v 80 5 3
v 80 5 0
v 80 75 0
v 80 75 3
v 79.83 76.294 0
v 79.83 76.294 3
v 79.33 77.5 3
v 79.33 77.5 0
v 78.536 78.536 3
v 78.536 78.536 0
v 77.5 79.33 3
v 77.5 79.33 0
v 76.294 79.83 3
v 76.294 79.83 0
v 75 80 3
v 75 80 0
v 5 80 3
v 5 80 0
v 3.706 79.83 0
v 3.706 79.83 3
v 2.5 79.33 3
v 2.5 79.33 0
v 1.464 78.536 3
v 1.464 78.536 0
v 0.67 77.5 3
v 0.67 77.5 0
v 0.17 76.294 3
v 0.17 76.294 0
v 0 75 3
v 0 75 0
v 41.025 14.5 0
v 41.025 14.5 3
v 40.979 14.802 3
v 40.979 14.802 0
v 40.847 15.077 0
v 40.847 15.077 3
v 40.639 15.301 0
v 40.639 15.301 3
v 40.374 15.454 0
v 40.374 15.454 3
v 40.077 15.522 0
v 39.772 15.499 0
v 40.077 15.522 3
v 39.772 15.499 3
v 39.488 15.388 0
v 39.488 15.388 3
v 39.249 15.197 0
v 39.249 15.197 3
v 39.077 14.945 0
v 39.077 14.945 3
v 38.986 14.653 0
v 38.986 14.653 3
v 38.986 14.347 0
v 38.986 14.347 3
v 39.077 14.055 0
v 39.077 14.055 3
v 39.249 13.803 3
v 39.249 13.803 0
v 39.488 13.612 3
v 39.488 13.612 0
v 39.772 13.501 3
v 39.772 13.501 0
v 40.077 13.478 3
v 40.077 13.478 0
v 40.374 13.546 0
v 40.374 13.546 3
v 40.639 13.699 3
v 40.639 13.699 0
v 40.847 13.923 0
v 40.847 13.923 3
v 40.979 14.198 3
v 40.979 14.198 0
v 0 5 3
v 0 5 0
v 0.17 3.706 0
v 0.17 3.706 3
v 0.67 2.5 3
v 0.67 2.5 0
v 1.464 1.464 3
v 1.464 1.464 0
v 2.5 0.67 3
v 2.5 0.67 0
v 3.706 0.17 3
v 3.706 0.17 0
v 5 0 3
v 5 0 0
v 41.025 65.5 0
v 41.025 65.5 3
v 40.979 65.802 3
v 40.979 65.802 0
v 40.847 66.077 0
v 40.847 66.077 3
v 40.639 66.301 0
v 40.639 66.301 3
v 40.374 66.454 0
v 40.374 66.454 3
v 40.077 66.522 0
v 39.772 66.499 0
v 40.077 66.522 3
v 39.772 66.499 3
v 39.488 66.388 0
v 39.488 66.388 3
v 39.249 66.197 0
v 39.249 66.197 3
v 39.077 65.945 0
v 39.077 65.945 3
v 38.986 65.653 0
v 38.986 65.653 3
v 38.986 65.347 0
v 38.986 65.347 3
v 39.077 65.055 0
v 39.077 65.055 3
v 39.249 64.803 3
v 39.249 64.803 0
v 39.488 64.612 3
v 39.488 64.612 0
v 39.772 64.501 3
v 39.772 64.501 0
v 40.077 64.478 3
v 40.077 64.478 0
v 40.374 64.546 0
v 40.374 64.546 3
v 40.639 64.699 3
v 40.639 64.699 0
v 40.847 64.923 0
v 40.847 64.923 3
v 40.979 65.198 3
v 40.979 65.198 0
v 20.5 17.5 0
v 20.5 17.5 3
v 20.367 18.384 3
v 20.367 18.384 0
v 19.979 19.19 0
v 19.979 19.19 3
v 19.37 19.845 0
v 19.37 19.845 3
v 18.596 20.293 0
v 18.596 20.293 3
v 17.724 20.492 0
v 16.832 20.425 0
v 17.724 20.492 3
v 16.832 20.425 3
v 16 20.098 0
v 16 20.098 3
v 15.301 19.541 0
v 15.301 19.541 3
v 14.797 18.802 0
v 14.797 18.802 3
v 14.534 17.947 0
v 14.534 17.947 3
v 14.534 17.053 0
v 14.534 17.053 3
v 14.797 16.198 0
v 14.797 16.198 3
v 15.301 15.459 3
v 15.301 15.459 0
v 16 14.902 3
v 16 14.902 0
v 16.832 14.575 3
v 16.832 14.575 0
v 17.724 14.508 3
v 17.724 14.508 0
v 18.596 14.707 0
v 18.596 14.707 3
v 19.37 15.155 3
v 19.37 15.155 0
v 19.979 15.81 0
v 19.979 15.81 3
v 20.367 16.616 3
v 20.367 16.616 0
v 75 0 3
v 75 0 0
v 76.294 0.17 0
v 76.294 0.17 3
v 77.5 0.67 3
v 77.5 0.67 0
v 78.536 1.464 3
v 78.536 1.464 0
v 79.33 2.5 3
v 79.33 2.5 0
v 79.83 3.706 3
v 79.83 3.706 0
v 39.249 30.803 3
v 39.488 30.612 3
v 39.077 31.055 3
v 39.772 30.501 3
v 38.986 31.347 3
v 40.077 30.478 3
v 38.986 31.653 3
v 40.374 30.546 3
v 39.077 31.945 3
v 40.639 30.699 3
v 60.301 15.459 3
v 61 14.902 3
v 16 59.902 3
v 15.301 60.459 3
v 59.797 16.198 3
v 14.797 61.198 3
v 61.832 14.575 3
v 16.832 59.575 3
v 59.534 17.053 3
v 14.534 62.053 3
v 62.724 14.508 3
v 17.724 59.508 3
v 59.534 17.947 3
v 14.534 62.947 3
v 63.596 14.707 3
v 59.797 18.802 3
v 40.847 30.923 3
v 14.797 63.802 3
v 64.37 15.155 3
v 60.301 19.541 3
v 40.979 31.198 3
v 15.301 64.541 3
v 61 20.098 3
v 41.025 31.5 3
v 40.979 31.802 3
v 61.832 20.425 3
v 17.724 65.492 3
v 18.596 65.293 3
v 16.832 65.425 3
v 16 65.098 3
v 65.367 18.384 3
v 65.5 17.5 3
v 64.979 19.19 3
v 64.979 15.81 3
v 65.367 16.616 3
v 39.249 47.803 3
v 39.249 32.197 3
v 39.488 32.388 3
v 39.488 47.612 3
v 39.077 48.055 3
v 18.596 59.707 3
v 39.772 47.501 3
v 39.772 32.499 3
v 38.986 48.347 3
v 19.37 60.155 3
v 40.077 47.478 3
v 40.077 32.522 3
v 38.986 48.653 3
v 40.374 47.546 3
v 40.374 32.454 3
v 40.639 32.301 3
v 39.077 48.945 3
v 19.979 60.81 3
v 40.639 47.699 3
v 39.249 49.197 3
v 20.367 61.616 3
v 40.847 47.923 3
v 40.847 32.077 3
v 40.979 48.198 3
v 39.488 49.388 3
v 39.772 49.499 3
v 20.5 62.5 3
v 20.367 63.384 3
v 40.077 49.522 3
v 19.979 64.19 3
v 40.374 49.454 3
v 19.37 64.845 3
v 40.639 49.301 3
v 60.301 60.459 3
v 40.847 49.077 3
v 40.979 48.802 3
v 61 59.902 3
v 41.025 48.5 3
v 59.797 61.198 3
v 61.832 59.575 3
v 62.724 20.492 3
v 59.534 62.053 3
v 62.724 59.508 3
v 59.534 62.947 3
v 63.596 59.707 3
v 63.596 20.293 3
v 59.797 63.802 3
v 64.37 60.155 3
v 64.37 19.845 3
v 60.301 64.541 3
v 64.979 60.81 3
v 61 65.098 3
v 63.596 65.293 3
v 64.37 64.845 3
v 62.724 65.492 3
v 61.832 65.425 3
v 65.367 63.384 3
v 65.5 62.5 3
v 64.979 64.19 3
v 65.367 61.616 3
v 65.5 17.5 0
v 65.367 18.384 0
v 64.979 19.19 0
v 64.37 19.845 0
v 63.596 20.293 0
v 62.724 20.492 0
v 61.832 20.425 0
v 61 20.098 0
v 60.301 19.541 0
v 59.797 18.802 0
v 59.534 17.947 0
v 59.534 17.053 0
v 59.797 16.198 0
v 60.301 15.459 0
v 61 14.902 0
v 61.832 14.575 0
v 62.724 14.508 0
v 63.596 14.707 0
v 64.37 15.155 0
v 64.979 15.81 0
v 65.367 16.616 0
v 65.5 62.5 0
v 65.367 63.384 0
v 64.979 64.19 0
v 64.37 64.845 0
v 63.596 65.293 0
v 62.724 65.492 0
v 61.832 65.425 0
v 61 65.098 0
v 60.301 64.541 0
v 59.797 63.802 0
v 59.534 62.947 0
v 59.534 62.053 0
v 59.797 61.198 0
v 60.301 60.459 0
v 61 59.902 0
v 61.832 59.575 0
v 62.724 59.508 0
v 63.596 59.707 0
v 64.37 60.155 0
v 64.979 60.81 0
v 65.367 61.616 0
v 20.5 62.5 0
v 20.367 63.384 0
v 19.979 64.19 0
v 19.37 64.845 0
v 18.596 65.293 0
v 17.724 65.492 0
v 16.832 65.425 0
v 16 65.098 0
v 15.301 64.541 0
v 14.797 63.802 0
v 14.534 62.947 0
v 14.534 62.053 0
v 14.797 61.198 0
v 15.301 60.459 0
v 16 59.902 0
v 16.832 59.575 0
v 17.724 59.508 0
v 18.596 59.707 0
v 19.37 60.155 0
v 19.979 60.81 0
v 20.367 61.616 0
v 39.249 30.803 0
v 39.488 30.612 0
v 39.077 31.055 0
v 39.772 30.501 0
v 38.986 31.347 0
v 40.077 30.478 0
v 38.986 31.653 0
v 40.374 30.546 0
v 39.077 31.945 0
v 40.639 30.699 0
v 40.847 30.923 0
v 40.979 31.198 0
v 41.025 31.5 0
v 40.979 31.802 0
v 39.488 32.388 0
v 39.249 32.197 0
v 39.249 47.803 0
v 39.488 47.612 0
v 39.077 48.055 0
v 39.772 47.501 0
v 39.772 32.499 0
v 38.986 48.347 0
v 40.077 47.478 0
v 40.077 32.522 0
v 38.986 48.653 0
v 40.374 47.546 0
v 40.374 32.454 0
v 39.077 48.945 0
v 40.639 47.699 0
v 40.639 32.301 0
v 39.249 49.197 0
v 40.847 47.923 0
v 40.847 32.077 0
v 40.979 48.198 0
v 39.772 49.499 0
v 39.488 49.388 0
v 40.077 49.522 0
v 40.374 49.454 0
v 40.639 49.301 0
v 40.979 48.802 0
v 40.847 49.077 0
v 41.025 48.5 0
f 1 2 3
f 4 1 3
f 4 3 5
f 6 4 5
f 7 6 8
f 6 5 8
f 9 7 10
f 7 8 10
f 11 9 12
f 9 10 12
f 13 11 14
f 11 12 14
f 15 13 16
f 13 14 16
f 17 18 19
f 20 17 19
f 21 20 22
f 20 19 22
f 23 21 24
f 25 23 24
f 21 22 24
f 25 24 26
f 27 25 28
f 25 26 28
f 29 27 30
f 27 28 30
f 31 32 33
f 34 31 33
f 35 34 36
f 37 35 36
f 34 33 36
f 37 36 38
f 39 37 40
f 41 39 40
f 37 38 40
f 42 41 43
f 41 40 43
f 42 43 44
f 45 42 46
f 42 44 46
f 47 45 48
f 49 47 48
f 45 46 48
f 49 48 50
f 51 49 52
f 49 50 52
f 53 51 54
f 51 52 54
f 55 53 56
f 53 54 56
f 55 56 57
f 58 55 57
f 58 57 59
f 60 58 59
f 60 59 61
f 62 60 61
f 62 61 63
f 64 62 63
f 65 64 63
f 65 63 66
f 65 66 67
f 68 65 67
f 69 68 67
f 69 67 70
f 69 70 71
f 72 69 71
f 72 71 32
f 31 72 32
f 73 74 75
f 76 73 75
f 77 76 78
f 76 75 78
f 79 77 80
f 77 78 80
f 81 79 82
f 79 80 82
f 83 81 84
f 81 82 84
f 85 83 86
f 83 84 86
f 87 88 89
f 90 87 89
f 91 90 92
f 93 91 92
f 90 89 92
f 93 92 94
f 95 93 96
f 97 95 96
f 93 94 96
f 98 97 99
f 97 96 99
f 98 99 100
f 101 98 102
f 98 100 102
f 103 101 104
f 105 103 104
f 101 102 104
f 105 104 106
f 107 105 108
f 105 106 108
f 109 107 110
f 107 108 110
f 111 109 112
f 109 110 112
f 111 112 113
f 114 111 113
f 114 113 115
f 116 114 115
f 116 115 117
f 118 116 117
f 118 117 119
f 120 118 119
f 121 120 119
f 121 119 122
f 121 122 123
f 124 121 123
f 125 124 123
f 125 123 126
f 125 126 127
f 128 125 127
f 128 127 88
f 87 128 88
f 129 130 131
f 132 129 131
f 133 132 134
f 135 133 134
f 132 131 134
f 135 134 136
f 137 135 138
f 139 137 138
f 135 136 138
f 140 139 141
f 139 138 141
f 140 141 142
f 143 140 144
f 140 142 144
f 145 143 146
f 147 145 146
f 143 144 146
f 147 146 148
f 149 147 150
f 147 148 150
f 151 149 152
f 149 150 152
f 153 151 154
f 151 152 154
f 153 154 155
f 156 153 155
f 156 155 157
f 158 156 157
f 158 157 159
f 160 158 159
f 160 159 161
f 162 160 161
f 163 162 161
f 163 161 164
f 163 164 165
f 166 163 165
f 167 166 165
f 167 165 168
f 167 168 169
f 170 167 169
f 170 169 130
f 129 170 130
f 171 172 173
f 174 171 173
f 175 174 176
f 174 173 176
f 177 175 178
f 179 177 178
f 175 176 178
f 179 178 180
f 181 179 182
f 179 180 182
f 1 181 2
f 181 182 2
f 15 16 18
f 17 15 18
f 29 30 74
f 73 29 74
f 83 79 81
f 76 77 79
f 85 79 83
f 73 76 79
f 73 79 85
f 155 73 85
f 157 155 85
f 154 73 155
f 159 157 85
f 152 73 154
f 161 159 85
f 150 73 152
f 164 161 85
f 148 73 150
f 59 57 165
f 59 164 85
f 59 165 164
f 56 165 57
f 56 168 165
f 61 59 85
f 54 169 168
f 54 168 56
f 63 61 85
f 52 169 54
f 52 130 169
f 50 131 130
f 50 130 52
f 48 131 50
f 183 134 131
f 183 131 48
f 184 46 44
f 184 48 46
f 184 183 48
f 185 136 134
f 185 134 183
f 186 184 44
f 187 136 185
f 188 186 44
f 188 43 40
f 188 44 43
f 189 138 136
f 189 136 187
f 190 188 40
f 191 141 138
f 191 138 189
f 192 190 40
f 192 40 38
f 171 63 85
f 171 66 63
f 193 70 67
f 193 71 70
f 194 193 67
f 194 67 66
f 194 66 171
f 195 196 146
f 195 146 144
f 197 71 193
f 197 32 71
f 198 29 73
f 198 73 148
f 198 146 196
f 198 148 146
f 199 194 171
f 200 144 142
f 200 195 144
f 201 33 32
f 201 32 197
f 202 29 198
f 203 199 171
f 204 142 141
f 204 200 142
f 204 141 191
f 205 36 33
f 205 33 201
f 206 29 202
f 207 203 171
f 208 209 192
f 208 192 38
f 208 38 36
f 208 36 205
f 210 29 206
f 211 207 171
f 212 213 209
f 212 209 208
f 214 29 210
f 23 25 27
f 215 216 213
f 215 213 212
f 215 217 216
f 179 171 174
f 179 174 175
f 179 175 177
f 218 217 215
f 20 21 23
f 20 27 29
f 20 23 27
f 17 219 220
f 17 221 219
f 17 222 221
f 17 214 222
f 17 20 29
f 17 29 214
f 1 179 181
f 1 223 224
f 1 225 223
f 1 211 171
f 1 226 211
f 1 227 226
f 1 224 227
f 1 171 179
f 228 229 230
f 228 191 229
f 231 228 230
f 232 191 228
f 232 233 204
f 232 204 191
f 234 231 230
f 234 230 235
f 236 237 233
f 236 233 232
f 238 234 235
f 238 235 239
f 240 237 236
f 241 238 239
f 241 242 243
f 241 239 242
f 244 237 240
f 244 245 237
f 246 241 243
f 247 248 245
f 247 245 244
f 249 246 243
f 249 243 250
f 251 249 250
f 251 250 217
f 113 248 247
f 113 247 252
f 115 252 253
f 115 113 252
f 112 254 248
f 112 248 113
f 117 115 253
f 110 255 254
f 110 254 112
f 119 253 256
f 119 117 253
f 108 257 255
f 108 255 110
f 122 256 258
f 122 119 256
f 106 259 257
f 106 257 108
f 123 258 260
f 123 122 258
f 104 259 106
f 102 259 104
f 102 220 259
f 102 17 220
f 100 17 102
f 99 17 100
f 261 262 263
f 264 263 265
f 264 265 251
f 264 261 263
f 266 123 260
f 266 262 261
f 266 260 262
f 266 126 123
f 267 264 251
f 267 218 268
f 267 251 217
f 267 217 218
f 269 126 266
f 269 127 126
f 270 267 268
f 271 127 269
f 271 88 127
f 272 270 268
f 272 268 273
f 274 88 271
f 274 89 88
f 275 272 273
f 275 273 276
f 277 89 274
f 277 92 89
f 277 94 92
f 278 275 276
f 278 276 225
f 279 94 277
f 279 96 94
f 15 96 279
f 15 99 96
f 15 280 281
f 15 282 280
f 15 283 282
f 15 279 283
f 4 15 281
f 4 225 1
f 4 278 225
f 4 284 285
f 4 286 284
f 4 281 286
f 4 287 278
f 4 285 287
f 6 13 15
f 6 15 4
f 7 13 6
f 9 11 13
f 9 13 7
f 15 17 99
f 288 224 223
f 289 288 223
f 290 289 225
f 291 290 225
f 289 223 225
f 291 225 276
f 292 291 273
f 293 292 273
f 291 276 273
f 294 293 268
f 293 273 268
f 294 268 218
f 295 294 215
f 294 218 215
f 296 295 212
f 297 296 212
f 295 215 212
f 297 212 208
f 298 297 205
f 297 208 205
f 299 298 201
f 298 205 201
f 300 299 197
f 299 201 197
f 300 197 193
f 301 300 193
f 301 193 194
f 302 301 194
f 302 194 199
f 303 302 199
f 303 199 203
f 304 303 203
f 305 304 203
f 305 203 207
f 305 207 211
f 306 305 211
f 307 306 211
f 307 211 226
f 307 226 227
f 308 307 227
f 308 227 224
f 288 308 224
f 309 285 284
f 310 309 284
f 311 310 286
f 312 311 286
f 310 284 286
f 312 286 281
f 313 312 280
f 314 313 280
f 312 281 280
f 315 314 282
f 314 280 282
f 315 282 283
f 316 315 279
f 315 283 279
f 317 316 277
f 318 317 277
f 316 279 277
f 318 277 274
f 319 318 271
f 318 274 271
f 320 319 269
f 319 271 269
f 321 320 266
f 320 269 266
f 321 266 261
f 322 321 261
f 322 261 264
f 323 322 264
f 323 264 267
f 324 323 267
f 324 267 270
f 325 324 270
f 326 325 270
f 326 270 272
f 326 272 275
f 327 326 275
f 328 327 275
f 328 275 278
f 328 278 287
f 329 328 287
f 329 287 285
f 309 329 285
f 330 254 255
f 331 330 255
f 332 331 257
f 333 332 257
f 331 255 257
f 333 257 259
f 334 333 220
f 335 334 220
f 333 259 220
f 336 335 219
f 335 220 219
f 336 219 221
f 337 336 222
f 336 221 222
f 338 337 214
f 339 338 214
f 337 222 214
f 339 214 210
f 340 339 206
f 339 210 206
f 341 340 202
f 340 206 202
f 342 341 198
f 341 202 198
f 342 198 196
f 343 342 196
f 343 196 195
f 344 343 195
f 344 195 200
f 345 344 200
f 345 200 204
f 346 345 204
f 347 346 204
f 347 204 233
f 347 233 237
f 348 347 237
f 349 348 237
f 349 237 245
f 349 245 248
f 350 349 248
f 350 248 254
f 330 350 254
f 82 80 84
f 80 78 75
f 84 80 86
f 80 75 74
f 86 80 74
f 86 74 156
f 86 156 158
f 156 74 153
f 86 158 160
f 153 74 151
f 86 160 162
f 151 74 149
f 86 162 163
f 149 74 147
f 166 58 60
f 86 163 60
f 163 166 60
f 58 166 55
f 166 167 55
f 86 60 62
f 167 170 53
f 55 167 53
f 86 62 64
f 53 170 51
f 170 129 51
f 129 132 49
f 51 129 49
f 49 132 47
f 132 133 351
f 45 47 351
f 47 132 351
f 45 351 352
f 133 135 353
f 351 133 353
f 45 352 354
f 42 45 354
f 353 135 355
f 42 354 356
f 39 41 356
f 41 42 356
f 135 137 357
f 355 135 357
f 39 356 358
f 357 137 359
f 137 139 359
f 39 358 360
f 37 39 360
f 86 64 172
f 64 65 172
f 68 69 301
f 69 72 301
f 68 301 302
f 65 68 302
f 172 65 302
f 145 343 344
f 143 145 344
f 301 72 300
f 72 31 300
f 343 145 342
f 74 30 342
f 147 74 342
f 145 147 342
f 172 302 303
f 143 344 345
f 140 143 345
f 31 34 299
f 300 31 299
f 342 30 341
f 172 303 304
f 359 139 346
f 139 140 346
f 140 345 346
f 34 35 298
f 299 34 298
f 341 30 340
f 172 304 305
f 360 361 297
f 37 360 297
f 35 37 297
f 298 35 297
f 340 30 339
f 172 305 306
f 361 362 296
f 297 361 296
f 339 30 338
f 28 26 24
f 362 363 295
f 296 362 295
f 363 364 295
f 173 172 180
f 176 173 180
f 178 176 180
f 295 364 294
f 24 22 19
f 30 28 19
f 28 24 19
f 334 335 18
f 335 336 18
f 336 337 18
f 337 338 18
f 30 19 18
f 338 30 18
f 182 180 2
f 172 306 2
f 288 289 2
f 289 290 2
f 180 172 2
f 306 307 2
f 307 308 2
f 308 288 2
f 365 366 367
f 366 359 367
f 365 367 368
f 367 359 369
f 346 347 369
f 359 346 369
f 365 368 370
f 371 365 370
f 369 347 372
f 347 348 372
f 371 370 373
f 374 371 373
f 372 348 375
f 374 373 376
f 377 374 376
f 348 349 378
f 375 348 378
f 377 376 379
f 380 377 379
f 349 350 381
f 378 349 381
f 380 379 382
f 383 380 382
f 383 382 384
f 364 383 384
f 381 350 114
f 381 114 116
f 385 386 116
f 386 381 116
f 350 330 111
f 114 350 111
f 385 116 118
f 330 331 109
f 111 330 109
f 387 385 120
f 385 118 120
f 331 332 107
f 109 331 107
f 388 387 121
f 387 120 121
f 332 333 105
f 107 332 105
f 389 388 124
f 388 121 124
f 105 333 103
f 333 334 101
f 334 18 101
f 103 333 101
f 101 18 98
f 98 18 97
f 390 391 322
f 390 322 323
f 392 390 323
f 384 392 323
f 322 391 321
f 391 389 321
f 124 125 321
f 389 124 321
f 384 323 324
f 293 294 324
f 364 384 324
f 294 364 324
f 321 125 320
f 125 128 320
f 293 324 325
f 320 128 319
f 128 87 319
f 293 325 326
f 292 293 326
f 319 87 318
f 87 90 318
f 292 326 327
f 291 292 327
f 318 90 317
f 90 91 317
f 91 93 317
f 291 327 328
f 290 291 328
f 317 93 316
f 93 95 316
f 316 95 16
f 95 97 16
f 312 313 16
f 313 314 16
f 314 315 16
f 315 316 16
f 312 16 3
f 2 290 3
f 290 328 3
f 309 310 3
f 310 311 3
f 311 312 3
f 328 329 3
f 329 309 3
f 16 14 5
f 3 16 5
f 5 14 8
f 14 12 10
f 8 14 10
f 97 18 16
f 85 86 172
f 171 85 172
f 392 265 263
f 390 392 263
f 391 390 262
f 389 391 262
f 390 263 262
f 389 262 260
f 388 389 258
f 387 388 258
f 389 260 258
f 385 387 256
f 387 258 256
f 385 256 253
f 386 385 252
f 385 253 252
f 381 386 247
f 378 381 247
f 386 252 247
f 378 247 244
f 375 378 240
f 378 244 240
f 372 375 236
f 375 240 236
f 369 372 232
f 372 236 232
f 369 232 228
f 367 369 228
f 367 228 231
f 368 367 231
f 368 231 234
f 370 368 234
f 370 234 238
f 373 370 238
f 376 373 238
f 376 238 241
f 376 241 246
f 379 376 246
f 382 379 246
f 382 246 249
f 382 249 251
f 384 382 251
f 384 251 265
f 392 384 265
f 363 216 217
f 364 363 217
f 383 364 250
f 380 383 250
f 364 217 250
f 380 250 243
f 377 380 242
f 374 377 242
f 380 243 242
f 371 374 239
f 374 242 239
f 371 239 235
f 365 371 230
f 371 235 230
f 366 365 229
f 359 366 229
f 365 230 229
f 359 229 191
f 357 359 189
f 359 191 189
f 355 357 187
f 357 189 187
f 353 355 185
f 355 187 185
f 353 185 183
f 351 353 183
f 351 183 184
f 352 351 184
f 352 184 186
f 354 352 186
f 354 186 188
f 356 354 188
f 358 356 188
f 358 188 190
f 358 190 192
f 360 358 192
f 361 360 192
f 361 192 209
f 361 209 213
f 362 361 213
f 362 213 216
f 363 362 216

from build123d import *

# Parameters (mm, degrees)
F1_DEPTH = 3
F2_R     = 1.025
F2_R_2   = 3
F3_DEPTH = 25


with BuildPart() as f1:
    # F0 (on Top) → F1 (new body)
    with BuildSketch(Plane.XY):
        with BuildLine():
            ThreePointArc((0, 5), (1.464466, 1.464466), (5, 0))
            Line((5, 0), (75, 0))
            ThreePointArc((75, 0), (78.535534, 1.464466), (80, 5))
            Line((80, 5), (80, 75))
            ThreePointArc((80, 75), (78.535534, 78.535534), (75, 80))
            Line((75, 80), (5, 80))
            ThreePointArc((5, 80), (1.464466, 78.535534), (0, 75))
            Line((0, 75), (0, 5))
        make_face()
    extrude(amount=F1_DEPTH)

    # F2 (on face) → F3 (cut)
    with BuildSketch(Plane.XY.offset(3)):
        with Locations((40, 48.5)):
            Circle(F2_R)
        with Locations((40, 31.5)):
            Circle(F2_R)
        with Locations((62.5, 62.5)):
            Circle(F2_R_2)
        with Locations((40, 65.5)):
            Circle(F2_R)
        with Locations((40, 14.5)):
            Circle(F2_R)
        with Locations((62.5, 17.5)):
            Circle(F2_R_2)
        with Locations((17.5, 62.5)):
            Circle(F2_R_2)
        with Locations((17.5, 17.5)):
            Circle(F2_R_2)
    extrude(amount=-F3_DEPTH, mode=Mode.SUBTRACT)


solid = f1.part
